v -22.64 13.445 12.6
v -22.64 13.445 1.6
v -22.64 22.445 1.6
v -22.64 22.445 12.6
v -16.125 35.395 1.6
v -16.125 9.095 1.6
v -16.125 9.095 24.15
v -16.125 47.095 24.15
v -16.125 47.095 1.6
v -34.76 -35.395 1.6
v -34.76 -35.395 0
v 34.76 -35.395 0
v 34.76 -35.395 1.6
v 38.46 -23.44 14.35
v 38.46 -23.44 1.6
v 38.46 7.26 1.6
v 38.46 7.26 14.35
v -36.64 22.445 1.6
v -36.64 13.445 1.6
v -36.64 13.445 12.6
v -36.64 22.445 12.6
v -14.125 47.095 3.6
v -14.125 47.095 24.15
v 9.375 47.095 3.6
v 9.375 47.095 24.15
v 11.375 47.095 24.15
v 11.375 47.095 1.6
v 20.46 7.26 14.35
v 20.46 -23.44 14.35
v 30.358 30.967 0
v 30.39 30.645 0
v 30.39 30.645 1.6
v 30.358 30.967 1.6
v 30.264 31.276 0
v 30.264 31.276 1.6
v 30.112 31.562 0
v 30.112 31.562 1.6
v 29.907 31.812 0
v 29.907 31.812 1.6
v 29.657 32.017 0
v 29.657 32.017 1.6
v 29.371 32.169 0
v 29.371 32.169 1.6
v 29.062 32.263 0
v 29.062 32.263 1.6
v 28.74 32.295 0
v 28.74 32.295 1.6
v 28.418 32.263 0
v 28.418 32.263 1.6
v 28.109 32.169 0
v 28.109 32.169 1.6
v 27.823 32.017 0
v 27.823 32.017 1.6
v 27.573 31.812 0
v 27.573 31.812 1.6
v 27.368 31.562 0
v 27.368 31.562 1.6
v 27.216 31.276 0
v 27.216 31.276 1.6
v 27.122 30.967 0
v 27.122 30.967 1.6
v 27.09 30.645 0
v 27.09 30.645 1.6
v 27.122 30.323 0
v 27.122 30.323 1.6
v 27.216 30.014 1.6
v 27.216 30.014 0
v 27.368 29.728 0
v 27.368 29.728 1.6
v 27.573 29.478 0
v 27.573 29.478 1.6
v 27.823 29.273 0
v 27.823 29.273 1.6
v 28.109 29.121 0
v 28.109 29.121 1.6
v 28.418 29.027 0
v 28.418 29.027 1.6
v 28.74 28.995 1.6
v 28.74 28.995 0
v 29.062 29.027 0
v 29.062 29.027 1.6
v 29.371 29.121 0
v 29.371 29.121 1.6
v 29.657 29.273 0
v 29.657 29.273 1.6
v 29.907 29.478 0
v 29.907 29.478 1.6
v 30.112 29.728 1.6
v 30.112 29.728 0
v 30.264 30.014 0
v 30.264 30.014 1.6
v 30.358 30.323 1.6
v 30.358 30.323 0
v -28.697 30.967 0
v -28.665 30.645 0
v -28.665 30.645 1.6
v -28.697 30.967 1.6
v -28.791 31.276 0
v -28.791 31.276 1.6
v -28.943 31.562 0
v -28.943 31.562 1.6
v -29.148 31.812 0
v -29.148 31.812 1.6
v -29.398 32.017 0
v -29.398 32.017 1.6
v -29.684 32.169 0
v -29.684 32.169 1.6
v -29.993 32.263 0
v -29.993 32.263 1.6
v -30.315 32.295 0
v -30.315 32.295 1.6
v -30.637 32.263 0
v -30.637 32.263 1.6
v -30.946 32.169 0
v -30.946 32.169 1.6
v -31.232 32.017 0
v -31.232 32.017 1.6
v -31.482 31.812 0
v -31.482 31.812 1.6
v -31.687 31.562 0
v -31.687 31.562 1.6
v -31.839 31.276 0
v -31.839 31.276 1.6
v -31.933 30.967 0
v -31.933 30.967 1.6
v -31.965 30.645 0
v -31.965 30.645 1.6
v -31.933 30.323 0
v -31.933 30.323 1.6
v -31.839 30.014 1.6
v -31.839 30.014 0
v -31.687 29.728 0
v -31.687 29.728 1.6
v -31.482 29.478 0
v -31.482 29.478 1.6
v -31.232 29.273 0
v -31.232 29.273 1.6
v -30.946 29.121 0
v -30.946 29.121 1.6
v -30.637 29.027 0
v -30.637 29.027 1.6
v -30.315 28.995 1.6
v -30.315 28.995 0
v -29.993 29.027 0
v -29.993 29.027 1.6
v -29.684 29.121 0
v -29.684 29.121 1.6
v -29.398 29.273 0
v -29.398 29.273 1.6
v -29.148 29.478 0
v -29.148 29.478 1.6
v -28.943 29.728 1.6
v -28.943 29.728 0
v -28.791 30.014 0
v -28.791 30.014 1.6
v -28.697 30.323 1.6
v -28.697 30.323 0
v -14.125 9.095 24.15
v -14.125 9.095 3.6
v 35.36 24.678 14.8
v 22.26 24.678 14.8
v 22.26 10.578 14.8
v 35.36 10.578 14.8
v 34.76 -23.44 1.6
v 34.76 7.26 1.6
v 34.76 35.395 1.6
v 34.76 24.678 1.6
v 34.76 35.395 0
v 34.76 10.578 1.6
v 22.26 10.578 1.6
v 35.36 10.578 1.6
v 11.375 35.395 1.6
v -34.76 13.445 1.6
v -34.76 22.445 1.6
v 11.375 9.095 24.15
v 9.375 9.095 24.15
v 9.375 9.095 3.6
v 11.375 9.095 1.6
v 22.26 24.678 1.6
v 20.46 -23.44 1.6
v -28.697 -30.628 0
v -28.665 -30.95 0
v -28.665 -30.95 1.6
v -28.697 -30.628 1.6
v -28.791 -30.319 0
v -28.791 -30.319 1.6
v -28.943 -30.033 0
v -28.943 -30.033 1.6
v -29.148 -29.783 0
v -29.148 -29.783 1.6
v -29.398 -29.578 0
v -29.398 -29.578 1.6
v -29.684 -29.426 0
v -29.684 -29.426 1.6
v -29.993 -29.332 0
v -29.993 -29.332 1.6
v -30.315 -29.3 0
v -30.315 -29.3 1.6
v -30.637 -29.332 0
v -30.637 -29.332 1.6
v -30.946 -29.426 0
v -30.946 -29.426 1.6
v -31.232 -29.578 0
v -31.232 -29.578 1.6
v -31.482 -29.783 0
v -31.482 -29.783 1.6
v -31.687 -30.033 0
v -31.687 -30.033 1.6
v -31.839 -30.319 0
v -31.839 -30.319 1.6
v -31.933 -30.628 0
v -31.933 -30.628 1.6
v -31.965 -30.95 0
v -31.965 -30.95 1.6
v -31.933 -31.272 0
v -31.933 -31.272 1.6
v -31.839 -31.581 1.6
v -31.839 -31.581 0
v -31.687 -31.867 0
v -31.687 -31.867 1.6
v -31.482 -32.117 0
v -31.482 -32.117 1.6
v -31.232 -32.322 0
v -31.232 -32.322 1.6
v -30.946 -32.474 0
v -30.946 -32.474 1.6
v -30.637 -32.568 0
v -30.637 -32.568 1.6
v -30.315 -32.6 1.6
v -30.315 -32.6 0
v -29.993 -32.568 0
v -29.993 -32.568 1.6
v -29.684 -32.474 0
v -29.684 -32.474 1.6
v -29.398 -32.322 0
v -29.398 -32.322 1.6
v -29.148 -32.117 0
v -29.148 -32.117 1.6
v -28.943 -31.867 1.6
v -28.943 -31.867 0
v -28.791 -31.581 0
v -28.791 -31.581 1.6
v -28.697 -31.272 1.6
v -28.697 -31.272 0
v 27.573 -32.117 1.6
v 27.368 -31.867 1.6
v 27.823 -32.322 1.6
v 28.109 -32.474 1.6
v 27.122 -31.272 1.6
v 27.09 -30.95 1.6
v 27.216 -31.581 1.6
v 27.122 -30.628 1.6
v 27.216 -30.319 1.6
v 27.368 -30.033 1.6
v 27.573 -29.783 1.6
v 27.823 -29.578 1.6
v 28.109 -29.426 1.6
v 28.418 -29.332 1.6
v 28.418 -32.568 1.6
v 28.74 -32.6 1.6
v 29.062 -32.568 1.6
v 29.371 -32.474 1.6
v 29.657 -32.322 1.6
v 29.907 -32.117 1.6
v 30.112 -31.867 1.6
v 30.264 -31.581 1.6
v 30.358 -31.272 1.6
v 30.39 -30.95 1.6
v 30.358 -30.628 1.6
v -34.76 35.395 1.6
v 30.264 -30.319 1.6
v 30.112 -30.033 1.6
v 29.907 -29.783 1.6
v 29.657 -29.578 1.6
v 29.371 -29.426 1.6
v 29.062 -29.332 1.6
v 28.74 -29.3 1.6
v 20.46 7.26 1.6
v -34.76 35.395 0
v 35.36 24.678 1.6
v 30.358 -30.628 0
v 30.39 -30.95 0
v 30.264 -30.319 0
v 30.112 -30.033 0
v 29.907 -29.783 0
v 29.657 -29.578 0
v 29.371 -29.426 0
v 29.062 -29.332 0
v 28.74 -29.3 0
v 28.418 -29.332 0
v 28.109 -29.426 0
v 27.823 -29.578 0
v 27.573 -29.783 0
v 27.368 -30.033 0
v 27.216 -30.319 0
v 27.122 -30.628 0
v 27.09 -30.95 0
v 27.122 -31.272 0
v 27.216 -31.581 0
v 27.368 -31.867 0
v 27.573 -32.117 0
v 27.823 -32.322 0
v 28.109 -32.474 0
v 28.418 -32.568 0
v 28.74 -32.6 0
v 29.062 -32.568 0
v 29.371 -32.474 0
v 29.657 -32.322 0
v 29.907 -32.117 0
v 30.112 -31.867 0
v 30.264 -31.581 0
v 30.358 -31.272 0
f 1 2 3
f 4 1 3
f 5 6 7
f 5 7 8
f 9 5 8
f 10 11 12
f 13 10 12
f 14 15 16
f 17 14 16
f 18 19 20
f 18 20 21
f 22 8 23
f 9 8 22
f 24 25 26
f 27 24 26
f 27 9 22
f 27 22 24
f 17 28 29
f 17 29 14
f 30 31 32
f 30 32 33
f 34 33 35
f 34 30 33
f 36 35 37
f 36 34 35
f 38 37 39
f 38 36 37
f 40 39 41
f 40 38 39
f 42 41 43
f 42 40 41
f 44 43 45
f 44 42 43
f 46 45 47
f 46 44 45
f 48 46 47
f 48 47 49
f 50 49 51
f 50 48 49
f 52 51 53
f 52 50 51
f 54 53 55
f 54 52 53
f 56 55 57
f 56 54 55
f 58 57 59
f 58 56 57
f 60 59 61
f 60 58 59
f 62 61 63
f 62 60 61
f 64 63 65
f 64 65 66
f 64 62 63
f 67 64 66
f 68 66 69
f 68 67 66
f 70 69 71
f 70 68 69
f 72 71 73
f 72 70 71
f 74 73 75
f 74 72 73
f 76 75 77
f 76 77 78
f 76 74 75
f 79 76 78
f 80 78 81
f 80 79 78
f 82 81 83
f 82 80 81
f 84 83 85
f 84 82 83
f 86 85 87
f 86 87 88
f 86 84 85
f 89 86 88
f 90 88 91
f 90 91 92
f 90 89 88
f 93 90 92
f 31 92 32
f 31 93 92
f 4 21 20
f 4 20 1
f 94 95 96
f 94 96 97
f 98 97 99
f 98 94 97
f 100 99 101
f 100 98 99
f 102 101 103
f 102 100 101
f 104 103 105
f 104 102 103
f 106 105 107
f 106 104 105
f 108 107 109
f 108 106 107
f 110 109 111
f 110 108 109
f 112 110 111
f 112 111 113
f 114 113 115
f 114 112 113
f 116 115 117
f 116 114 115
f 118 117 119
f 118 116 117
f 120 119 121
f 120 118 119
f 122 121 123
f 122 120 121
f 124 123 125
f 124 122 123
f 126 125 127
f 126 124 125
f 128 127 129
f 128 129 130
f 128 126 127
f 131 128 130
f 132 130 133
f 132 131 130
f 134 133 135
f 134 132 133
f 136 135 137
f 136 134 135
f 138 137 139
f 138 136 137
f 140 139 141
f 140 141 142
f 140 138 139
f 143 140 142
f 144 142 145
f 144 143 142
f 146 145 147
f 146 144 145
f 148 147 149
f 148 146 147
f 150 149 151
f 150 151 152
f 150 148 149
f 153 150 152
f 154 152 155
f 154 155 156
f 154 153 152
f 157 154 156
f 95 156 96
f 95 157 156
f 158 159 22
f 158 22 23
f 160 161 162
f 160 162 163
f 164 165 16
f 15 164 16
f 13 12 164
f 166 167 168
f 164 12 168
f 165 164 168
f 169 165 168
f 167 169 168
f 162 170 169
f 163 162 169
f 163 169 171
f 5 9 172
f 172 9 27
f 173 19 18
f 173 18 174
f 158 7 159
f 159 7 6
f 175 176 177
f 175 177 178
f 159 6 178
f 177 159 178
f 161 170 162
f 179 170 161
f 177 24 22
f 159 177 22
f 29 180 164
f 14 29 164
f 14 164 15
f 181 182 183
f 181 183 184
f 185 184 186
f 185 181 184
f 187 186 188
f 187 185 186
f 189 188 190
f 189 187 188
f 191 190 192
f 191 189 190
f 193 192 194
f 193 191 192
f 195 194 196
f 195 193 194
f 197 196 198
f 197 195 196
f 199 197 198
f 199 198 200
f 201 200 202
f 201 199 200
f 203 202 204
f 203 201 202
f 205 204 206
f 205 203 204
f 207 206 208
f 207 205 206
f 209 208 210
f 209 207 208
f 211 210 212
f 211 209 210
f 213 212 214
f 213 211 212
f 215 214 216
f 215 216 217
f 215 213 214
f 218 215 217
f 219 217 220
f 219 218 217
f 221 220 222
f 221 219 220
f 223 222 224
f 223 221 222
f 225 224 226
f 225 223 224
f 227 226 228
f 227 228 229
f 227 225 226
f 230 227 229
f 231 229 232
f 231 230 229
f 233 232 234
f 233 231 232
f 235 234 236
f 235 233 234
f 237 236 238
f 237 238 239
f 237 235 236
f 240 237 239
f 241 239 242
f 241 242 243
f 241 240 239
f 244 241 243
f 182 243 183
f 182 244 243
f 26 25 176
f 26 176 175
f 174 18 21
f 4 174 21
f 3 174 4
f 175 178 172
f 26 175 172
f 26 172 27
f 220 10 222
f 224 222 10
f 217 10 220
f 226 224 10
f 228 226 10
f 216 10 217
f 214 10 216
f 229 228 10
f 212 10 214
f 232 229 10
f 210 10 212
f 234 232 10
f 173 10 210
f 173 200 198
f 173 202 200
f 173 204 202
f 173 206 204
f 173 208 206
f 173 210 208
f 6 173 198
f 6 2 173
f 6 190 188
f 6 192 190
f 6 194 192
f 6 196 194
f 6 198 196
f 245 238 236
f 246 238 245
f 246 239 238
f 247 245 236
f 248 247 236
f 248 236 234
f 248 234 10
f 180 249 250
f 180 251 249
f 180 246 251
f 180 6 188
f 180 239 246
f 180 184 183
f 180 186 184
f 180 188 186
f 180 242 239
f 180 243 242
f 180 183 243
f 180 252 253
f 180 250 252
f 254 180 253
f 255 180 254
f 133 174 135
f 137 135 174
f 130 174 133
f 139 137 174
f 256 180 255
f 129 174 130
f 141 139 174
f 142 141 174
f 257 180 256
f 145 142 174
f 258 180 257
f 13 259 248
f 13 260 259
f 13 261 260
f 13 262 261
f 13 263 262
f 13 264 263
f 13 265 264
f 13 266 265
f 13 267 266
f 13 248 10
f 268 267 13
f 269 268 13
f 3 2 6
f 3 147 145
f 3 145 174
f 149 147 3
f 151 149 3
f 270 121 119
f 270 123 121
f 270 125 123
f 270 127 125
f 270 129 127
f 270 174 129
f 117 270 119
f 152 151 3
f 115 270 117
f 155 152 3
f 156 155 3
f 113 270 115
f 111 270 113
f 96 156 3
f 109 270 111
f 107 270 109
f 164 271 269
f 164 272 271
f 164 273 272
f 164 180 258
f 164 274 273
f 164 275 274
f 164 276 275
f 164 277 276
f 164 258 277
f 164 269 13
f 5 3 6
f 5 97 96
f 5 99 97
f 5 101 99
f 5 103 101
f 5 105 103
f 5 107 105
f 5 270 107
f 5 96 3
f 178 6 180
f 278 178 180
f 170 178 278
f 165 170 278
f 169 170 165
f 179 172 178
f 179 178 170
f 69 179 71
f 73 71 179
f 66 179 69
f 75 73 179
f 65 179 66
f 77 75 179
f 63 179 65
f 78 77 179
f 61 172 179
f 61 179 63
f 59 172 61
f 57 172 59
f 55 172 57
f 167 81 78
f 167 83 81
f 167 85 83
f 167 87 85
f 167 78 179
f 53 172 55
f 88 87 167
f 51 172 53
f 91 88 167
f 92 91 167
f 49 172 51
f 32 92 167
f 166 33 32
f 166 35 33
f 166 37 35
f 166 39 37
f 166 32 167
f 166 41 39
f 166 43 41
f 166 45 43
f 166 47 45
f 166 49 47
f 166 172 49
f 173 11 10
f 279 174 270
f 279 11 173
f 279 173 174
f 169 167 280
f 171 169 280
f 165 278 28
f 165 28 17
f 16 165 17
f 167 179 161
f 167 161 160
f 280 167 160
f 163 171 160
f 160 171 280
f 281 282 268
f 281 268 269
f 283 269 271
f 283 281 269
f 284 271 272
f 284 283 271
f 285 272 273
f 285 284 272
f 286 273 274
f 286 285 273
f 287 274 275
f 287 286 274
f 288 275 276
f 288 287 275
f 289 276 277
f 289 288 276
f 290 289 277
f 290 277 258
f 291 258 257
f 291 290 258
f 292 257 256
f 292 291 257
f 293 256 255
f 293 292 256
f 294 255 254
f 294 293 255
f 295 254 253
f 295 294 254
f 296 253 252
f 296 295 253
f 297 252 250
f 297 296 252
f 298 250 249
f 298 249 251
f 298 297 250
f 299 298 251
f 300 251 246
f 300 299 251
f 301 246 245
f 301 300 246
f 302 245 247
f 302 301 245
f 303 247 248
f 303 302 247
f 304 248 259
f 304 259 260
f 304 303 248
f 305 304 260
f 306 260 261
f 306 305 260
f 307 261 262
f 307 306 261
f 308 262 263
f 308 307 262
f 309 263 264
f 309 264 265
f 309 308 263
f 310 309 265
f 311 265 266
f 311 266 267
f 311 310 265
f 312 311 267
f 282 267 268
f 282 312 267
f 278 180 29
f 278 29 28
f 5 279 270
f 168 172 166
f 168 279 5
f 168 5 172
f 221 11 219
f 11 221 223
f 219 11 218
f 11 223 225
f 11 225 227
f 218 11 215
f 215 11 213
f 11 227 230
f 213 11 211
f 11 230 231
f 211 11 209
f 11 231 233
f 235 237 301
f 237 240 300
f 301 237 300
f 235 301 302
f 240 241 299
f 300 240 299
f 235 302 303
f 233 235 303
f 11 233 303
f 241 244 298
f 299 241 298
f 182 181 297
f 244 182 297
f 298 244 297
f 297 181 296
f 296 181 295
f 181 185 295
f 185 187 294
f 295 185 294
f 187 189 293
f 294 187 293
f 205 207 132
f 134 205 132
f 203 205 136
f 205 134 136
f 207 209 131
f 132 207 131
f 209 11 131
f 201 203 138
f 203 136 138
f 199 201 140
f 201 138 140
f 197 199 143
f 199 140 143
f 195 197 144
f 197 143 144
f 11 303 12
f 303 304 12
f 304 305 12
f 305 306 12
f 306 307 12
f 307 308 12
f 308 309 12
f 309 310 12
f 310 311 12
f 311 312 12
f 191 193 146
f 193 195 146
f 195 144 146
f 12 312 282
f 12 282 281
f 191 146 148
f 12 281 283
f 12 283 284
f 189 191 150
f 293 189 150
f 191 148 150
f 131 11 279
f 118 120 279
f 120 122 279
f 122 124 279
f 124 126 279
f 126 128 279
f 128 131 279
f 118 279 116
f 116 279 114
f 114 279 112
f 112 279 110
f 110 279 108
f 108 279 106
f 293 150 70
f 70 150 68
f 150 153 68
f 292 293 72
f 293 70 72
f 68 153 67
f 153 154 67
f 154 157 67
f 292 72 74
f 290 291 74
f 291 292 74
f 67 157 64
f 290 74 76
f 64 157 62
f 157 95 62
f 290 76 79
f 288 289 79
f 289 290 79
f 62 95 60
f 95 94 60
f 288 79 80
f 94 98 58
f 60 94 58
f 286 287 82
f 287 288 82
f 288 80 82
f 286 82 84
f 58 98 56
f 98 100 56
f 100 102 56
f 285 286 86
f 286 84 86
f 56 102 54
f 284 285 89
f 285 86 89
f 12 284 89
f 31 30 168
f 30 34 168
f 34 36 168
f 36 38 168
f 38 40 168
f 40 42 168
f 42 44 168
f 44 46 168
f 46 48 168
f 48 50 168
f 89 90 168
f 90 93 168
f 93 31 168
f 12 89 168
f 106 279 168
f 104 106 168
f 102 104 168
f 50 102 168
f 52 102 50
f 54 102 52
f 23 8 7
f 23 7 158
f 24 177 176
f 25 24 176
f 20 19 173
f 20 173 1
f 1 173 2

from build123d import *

# Parameters (mm, degrees)
SKETCH_W     = 69.52
SKETCH_H     = 70.79
SKETCH_R     = 1.65
PAD_DEPTH    = 1.6
SKETCH001_W  = 18
SKETCH001_H  = 30.7
PAD001_DEPTH = 12.75
SKETCH002_W  = 13.1
SKETCH002_H  = 14.1
PAD002_DEPTH = 13.2
SKETCH003_W  = 14
SKETCH003_H  = 9
PAD003_DEPTH = 11
SKETCH004_W  = 27.5
SKETCH004_H  = 38
PAD004_DEPTH = 22.55
SKETCH005_W  = 23.5
SKETCH005_H  = 23.222077
POCKET_DEPTH = 38


with BuildPart() as part:
    # Sketch → Pad (new body)
    with BuildSketch(Plane.XY):
        Rectangle(SKETCH_W, SKETCH_H)
        with Locations((-30.315, 30.645)):
            Circle(SKETCH_R, mode=Mode.SUBTRACT)
        with Locations((28.74, 30.645)):
            Circle(SKETCH_R, mode=Mode.SUBTRACT)
        with Locations((-30.315, -30.95)):
            Circle(SKETCH_R, mode=Mode.SUBTRACT)
        with Locations((28.74, -30.95)):
            Circle(SKETCH_R, mode=Mode.SUBTRACT)
    extrude(amount=PAD_DEPTH)

    # Sketch001 (on Face10 of Pad) → Pad001 (join)
    with BuildSketch(Plane.XY.offset(1.6)):
        with Locations((29.46, -8.09)):
            Rectangle(SKETCH001_W, SKETCH001_H)
    extrude(amount=PAD001_DEPTH)

    # Sketch002 (on Face5 of Pad001) → Pad002 (join)
    with BuildSketch(Plane.XY.offset(1.6)):
        with Locations((28.81, 17.6275)):
            Rectangle(SKETCH002_W, SKETCH002_H)
    extrude(amount=PAD002_DEPTH)

    # Sketch003 (on Face5 of Pad002) → Pad003 (join)
    with BuildSketch(Plane.XY.offset(1.6)):
        with Locations((-29.64, 17.945)):
            Rectangle(SKETCH003_W, SKETCH003_H)
    extrude(amount=PAD003_DEPTH)

    # Sketch004 (on Face5 of Pad003) → Pad004 (join)
    with BuildSketch(Plane.XY.offset(1.6)):
        with Locations((-2.375, 28.095)):
            Rectangle(SKETCH004_W, SKETCH004_H)
    extrude(amount=PAD004_DEPTH)

    # Sketch005 (on Face27 of Pad004) → Pocket (cut)
    with BuildSketch(Plane(origin=(0, 47.095, 0), x_dir=(-1, 0, 0), z_dir=(0, 1, 0))):
        with Locations((2.375, 15.211039)):
            Rectangle(SKETCH005_W, SKETCH005_H)
    extrude(amount=-POCKET_DEPTH, mode=Mode.SUBTRACT)


solid = part.part
